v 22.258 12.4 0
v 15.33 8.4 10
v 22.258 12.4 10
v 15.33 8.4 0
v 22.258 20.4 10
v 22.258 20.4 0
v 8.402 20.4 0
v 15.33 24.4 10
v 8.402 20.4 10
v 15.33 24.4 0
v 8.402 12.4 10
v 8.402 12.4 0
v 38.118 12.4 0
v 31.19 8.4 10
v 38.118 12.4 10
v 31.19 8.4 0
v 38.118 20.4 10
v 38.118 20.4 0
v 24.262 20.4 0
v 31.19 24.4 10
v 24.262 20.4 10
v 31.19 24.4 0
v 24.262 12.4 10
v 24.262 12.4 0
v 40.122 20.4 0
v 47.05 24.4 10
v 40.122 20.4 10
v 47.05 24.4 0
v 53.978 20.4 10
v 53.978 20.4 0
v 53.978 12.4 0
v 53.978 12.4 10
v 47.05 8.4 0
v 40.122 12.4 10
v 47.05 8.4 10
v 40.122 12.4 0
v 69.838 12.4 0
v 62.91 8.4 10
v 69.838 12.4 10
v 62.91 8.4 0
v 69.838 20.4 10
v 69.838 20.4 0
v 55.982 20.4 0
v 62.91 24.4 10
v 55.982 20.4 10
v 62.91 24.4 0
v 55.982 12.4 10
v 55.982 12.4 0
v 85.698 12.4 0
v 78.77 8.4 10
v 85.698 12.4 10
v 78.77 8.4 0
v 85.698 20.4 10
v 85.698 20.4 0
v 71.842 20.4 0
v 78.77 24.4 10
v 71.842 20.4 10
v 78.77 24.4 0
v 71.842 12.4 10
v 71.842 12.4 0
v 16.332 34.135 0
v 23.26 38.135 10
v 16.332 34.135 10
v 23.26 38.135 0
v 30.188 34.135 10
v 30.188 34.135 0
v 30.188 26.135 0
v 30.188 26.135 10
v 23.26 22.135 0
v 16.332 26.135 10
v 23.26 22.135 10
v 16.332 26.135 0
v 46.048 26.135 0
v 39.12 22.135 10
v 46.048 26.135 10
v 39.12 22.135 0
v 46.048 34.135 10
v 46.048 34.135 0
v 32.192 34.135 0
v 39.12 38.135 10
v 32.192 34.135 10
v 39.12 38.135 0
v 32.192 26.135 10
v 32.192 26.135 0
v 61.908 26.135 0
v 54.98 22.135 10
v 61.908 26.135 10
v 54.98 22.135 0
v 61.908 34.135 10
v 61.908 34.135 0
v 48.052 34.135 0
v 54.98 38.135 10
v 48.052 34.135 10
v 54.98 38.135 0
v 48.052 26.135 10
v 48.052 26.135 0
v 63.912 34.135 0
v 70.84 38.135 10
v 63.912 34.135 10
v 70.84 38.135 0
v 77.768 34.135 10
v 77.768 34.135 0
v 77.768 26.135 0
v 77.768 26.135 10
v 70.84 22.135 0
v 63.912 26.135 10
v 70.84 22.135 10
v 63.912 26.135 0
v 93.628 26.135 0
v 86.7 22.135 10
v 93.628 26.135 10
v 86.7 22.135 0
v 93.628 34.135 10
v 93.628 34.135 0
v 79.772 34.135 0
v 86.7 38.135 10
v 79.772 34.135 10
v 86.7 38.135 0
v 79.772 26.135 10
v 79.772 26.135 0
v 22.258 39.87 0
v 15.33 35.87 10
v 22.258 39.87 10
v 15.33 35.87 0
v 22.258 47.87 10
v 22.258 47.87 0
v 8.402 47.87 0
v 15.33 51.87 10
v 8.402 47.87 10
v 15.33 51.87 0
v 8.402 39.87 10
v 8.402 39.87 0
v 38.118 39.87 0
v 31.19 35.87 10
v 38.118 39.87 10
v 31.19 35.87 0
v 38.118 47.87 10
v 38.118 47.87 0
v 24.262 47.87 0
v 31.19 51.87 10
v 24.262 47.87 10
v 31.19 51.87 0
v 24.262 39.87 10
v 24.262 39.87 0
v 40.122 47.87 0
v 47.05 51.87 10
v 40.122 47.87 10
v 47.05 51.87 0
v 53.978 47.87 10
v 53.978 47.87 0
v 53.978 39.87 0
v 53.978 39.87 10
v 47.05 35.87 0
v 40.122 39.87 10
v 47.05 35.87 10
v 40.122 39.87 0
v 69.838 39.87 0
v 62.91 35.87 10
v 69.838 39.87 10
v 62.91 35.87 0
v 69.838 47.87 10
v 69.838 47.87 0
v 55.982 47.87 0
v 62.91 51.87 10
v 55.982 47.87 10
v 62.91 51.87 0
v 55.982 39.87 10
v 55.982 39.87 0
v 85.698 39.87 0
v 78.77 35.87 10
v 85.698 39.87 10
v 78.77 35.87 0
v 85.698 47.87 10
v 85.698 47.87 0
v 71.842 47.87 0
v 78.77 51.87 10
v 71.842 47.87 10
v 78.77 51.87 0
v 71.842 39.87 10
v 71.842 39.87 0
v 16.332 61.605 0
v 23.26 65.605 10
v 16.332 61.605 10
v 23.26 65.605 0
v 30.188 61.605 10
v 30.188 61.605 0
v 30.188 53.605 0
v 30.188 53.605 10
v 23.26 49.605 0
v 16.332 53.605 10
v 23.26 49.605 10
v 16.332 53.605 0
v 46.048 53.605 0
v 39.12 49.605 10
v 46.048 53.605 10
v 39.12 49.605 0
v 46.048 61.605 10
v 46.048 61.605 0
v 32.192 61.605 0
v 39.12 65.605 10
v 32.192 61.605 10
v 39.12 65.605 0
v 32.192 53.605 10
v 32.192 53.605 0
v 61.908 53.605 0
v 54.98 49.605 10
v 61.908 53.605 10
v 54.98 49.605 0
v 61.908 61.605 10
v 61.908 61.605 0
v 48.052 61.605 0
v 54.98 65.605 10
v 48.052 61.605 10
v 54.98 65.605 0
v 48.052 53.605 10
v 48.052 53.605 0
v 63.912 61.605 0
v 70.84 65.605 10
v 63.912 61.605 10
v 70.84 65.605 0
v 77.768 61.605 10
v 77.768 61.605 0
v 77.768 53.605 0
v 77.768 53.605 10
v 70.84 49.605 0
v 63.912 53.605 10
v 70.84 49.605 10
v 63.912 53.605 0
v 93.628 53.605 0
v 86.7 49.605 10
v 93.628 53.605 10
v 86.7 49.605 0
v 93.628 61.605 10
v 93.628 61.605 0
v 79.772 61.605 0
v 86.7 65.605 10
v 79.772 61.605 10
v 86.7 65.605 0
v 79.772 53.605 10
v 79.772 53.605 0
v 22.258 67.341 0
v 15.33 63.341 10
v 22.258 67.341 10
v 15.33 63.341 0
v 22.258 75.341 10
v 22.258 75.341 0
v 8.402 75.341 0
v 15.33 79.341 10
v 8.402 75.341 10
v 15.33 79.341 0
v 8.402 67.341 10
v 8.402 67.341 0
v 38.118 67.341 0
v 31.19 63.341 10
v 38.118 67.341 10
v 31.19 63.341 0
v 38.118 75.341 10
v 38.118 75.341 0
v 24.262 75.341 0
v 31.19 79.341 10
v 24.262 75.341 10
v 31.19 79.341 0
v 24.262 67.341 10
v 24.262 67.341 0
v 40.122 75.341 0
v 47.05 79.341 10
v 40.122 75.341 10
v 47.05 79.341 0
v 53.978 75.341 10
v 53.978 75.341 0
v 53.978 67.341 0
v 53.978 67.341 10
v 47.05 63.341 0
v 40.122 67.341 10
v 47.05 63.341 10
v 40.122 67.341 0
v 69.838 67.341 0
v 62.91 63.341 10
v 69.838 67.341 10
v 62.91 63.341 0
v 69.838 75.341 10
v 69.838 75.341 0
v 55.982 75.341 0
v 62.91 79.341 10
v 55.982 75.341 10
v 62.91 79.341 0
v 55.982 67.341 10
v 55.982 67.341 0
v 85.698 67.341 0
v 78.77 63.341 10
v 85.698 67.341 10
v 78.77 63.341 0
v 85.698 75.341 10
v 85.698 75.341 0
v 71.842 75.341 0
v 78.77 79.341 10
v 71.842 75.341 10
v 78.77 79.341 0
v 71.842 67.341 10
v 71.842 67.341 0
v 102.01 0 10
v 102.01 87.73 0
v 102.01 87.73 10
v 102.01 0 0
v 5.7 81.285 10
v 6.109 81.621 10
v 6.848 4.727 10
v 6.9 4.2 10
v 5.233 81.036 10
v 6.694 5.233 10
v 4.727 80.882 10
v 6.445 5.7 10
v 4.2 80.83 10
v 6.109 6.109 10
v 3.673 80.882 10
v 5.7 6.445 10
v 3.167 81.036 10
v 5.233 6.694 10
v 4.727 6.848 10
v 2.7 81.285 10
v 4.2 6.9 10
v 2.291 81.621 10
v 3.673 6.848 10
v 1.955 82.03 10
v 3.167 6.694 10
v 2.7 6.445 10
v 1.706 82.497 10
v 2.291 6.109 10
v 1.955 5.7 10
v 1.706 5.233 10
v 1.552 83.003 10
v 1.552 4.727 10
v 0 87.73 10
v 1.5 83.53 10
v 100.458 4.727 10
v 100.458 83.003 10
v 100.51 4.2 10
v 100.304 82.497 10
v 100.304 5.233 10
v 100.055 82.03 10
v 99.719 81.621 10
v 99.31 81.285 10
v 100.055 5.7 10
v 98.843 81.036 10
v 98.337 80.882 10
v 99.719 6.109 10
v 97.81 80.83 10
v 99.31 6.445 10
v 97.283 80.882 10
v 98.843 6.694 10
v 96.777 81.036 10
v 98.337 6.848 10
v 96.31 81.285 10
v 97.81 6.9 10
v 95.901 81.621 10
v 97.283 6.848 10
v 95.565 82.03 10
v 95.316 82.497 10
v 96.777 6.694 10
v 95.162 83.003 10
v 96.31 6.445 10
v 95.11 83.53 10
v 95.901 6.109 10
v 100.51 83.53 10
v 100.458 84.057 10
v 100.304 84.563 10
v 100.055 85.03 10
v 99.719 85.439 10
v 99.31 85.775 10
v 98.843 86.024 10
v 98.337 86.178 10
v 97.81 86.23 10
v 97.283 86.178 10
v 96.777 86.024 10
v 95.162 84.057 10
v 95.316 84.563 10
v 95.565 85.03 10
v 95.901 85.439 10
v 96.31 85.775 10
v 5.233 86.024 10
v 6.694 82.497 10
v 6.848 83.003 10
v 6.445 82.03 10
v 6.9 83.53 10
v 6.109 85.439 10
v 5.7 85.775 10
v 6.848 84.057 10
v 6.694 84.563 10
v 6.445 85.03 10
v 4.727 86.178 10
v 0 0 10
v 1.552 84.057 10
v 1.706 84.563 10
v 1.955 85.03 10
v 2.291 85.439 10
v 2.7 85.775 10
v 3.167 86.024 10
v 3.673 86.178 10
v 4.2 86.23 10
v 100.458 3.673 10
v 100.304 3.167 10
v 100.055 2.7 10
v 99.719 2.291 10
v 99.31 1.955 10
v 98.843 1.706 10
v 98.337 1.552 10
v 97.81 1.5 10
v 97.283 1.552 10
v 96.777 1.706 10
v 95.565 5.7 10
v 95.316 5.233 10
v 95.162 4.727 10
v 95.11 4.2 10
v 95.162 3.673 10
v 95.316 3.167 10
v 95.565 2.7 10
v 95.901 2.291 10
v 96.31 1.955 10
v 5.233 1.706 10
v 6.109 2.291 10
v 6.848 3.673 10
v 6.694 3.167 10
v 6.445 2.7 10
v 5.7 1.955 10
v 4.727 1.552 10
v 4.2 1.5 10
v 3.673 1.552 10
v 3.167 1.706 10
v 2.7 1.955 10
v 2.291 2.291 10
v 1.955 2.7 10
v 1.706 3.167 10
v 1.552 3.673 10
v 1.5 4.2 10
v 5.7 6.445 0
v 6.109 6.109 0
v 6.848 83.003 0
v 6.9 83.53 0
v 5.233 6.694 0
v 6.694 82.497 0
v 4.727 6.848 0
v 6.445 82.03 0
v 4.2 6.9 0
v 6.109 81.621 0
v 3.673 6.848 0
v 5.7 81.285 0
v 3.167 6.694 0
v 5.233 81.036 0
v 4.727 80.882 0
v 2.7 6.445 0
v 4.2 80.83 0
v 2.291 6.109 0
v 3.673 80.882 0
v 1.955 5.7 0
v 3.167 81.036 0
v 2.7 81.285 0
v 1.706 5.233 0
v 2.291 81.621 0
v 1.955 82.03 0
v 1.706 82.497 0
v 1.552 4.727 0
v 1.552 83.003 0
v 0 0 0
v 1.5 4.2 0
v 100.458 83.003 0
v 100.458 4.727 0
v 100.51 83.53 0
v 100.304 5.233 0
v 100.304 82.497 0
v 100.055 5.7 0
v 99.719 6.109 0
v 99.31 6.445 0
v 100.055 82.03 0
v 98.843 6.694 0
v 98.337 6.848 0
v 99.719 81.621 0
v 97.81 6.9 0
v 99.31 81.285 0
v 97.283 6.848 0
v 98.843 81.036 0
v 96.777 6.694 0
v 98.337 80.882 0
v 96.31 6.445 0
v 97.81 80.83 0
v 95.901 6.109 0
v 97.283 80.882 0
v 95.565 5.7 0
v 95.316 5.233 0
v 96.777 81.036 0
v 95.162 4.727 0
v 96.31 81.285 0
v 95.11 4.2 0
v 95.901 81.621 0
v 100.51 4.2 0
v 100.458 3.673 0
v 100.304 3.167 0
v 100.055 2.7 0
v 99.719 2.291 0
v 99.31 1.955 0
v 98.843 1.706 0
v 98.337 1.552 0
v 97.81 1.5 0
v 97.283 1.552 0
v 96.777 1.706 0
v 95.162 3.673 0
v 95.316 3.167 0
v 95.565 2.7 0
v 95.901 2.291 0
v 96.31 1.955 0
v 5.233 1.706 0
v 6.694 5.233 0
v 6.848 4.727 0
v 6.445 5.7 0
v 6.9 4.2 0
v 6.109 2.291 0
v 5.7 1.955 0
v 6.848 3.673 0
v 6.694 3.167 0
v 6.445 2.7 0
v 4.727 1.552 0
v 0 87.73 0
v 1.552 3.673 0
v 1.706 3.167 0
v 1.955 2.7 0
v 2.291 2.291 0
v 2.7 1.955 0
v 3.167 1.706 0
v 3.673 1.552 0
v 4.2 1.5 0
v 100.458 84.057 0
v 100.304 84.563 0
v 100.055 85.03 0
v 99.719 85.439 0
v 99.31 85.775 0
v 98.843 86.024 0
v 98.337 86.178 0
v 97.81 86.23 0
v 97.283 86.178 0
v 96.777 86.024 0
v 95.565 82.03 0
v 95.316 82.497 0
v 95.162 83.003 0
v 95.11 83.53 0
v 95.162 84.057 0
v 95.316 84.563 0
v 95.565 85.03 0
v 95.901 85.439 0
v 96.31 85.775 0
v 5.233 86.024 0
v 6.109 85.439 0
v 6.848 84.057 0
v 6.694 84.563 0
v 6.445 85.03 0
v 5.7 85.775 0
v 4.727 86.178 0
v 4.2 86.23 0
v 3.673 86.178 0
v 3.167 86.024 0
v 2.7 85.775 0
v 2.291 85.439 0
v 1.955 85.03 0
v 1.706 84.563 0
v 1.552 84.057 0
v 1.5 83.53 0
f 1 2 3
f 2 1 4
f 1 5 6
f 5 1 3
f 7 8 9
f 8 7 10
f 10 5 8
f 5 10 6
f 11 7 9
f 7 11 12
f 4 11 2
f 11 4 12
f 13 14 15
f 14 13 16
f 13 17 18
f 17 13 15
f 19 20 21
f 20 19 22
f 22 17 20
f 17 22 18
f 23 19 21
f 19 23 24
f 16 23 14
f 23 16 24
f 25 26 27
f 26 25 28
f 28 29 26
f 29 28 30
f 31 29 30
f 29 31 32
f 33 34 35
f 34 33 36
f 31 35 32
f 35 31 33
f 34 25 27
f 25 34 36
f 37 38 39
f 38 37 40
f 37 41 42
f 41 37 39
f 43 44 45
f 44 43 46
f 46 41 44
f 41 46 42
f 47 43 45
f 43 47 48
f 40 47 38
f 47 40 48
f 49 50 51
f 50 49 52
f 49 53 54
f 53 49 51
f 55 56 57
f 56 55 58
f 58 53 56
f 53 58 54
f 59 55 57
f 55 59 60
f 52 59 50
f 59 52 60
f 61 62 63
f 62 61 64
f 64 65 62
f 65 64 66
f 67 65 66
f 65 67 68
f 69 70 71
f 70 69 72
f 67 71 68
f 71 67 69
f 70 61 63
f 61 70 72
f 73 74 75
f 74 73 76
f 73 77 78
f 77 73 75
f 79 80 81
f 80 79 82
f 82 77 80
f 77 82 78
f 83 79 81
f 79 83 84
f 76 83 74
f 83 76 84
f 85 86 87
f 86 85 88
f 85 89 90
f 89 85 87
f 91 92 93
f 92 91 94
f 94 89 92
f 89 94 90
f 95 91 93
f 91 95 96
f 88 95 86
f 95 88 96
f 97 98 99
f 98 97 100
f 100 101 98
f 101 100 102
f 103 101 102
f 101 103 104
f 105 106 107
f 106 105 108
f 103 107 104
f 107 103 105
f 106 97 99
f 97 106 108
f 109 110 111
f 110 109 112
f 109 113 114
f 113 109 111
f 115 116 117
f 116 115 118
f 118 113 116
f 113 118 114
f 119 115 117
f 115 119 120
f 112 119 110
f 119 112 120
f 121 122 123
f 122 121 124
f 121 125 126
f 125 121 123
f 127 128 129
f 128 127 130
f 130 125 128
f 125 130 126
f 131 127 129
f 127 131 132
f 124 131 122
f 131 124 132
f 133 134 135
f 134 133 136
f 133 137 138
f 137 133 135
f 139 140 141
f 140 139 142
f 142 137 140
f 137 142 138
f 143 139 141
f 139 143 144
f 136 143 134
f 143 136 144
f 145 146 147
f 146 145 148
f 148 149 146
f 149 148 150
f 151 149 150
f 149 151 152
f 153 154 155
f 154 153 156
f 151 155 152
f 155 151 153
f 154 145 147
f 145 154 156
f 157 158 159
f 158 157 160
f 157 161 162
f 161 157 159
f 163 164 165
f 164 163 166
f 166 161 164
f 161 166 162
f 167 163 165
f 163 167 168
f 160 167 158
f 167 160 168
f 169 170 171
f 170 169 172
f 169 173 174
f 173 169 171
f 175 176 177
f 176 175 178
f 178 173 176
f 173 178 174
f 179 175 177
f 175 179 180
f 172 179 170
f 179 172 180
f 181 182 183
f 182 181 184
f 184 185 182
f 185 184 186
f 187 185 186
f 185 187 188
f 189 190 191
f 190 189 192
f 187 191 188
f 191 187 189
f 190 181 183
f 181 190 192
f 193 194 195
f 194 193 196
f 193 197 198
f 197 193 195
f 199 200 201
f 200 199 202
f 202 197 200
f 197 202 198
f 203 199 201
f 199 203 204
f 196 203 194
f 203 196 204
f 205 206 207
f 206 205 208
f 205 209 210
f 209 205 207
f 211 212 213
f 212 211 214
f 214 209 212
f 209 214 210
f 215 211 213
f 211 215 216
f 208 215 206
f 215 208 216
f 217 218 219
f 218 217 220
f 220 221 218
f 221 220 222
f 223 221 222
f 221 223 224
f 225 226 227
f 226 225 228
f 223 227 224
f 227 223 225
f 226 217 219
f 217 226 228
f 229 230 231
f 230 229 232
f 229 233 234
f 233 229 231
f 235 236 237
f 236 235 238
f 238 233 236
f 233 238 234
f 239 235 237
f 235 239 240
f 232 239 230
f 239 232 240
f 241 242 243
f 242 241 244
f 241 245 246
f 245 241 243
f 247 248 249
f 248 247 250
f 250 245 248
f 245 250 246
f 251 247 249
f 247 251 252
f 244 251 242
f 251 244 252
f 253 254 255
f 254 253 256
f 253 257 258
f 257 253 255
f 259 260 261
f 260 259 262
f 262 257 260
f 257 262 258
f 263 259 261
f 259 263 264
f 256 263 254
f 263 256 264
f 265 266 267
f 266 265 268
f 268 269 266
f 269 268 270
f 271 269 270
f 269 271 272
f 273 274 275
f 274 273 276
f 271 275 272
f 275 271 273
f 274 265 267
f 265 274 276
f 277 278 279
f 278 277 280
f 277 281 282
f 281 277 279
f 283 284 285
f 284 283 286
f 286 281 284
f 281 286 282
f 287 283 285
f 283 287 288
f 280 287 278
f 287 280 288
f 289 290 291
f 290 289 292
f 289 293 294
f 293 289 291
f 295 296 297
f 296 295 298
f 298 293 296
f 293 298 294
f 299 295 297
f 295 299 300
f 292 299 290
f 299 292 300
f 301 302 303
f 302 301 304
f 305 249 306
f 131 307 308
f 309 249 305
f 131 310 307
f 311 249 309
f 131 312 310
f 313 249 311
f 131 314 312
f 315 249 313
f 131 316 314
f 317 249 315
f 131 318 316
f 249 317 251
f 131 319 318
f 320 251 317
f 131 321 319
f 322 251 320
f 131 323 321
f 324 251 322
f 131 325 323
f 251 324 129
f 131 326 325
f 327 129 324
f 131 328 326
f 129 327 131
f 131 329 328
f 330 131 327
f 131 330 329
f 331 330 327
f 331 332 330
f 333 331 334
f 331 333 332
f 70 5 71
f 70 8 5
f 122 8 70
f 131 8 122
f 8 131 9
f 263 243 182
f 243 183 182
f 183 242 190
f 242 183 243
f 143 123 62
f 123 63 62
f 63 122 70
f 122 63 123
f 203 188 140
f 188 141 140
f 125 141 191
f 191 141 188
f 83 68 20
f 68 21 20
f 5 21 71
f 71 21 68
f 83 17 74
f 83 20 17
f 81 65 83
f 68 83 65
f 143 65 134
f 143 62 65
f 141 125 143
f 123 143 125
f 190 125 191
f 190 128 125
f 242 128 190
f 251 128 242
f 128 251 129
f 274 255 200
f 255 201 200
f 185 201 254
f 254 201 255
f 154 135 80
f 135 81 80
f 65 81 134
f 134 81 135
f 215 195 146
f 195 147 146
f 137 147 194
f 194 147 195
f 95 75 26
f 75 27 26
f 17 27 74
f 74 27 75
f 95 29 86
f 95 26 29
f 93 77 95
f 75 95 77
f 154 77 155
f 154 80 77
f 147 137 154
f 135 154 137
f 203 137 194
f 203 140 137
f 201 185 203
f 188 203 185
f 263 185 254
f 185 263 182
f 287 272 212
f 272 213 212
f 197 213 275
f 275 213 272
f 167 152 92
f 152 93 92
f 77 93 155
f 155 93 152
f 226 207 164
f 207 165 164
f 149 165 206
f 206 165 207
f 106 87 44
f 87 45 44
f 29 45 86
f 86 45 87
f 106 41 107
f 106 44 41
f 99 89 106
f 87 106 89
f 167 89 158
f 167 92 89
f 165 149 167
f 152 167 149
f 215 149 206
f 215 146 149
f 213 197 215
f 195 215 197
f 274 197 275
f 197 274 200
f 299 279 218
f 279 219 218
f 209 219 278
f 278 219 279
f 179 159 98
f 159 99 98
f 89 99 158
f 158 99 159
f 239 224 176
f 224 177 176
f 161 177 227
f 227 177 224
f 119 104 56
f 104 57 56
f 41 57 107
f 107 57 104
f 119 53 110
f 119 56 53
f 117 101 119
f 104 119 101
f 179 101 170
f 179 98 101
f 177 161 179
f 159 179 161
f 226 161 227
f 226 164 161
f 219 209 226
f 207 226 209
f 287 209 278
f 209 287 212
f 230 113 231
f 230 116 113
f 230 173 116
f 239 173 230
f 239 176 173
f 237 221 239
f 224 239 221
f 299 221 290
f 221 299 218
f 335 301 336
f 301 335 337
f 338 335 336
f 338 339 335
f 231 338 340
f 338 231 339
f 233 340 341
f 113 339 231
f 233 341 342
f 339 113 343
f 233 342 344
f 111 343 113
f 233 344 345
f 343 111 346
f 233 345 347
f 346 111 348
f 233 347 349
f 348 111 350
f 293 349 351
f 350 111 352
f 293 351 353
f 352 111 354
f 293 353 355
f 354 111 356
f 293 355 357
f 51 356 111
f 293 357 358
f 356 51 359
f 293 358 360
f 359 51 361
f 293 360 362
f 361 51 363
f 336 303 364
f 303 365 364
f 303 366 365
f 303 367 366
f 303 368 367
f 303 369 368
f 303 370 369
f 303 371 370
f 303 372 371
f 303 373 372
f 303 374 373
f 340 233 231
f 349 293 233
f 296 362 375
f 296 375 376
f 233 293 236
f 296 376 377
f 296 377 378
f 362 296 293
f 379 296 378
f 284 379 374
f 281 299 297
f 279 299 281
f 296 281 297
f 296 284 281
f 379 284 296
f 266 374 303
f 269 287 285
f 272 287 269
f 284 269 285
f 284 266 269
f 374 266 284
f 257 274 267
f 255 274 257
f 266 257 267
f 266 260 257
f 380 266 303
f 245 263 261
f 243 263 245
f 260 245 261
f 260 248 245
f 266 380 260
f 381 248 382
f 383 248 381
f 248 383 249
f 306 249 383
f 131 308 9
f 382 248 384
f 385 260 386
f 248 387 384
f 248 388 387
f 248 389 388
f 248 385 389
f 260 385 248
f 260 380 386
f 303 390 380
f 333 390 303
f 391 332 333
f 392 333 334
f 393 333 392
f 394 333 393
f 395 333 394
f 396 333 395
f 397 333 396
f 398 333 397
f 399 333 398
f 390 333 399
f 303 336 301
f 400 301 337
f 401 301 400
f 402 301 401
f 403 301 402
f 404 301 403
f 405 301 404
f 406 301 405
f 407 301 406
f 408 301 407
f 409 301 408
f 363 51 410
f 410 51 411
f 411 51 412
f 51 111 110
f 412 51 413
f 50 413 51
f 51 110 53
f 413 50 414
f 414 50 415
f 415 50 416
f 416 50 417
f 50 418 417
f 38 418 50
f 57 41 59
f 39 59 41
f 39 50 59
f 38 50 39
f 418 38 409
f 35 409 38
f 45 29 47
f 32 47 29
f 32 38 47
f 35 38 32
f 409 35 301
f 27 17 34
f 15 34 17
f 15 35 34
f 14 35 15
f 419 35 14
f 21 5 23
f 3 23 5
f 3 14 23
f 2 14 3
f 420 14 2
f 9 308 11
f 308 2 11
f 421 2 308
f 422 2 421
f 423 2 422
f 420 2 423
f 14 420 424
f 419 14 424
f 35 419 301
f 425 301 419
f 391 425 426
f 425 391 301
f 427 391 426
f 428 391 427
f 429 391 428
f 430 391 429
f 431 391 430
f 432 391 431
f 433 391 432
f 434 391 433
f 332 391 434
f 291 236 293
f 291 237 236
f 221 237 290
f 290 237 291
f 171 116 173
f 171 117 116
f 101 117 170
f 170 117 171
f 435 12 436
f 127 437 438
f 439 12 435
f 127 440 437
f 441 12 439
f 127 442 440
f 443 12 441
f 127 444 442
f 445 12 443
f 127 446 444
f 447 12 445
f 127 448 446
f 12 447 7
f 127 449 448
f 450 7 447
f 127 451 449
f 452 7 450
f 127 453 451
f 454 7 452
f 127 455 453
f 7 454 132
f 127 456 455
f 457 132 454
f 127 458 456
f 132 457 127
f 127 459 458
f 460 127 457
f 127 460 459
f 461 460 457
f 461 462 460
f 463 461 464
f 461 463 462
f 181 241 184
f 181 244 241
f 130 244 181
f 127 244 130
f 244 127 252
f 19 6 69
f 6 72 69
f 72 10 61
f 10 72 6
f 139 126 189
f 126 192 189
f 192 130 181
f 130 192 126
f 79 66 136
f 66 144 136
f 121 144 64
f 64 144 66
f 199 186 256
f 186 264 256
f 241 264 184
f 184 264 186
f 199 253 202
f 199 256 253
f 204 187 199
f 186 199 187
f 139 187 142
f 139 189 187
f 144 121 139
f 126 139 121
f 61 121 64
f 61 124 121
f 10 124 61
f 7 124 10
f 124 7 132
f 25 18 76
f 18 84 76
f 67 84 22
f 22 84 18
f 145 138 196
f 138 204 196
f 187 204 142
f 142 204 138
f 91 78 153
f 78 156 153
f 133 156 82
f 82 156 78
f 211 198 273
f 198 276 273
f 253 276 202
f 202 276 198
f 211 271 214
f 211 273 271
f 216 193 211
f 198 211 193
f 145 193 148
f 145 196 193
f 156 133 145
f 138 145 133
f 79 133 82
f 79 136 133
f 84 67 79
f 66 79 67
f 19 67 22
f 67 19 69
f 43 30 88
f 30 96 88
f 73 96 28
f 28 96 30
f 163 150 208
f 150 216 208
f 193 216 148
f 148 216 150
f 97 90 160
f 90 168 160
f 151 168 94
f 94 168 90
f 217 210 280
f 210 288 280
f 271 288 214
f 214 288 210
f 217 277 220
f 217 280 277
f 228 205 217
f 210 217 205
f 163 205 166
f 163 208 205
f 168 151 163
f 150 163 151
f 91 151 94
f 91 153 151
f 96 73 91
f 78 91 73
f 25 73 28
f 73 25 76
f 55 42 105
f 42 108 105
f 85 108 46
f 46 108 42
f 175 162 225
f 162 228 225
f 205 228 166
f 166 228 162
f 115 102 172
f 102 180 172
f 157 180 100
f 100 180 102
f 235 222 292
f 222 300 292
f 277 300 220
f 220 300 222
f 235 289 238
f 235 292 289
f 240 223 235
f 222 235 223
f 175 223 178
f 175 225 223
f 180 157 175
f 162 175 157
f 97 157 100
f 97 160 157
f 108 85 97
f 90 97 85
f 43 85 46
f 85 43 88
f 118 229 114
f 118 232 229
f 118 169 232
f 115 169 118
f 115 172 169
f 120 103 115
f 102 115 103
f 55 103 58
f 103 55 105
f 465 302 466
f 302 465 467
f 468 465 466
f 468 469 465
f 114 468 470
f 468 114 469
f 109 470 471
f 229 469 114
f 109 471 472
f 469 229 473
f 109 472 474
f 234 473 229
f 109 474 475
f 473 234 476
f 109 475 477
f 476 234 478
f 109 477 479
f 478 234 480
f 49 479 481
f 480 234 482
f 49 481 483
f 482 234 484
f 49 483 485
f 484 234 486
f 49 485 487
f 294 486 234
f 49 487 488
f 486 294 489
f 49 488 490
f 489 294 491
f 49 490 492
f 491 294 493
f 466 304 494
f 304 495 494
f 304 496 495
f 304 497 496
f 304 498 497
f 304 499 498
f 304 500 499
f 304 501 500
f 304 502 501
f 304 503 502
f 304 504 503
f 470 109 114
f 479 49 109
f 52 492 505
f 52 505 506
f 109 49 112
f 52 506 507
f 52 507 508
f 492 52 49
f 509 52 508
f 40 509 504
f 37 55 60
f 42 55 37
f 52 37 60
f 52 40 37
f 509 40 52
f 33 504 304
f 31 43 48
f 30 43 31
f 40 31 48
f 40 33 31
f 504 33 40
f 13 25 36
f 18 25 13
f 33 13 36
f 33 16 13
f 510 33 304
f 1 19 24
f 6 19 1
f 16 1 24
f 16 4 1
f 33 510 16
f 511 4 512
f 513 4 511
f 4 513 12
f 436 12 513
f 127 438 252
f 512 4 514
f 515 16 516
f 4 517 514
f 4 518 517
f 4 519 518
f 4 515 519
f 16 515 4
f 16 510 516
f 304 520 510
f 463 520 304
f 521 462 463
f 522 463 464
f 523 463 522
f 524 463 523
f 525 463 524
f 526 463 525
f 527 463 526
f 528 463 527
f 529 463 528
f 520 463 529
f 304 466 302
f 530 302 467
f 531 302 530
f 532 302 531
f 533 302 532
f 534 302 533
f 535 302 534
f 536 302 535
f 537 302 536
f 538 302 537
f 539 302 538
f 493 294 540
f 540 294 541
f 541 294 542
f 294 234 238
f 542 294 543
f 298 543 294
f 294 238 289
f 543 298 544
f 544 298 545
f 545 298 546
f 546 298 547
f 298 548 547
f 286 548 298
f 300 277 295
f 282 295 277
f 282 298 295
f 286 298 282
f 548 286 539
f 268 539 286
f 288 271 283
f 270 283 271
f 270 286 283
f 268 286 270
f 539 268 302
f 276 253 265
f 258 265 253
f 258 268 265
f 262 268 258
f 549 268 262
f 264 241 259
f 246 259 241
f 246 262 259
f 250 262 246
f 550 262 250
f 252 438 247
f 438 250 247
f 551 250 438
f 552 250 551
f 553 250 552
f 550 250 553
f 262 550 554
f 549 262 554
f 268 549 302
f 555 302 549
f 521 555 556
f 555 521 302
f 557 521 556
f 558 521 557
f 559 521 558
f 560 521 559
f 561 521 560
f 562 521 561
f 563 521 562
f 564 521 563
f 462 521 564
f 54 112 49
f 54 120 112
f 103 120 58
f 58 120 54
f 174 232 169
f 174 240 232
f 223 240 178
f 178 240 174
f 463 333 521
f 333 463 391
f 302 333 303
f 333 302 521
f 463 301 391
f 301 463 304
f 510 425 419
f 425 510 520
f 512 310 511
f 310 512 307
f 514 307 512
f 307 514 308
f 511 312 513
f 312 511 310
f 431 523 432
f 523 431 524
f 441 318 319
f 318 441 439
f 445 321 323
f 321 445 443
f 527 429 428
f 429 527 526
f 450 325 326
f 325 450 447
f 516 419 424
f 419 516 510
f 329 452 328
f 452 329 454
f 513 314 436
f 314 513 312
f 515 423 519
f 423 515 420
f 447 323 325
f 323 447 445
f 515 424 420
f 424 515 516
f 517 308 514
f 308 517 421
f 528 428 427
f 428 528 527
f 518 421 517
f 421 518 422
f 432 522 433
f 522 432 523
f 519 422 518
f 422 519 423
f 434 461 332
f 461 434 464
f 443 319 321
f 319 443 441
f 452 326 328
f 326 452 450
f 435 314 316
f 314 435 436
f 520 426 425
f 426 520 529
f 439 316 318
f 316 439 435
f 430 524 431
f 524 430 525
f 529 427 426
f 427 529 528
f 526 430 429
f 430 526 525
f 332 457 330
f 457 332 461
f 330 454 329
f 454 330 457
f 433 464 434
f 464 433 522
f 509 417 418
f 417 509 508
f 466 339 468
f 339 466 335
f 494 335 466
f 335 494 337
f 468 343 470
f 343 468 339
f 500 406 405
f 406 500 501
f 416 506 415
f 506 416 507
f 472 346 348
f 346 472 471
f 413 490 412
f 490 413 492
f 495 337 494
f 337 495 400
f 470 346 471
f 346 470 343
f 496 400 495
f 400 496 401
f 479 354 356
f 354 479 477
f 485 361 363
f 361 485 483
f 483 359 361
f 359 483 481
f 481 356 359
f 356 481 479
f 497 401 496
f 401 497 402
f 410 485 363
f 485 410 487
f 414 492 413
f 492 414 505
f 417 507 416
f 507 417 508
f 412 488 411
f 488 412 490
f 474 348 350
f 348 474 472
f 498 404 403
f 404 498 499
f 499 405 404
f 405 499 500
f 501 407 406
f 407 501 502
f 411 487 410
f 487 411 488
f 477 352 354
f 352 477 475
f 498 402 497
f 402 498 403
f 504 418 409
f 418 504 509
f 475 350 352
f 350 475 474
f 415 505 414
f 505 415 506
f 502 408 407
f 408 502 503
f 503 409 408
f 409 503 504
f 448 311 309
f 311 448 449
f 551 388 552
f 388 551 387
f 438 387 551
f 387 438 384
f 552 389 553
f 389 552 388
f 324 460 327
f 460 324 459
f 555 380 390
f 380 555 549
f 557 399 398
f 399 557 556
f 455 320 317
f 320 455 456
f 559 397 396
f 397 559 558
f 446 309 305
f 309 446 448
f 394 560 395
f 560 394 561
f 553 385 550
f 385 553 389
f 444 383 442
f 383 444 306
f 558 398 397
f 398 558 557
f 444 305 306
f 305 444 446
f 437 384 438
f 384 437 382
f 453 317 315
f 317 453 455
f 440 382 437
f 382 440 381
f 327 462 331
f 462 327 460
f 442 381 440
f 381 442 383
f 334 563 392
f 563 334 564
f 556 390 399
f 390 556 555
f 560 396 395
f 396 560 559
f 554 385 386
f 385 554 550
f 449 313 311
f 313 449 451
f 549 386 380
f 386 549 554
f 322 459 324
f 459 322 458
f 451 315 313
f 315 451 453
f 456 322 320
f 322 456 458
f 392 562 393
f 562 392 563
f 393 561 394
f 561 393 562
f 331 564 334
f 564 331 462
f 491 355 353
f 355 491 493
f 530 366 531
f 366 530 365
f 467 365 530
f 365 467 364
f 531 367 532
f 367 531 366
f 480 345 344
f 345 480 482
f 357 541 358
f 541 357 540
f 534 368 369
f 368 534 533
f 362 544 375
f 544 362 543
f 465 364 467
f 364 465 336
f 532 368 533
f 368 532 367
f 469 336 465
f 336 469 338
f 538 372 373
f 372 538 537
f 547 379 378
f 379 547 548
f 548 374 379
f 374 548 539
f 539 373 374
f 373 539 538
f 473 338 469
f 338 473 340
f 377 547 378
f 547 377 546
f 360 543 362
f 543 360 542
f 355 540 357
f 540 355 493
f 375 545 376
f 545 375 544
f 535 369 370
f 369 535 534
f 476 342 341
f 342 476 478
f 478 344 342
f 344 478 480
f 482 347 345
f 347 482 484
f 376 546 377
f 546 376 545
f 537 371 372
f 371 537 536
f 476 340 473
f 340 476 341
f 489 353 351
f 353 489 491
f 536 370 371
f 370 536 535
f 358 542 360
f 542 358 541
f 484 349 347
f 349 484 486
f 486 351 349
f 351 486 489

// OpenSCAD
$fn = 32;

// ----------------------------------------------------------------------
// Honeycomb panel: 102.01 x 87.73 mm, 25 cells of 16 mm
// ----------------------------------------------------------------------

// --- parameters (mm) ---
panel_w = 102.01;         // panel width
panel_d = 87.73;          // panel depth
thick = 10;               // panel thickness
cell_r = 8;               // hex cell circumradius
pitch = 15.86;            // hex cell pitch (centre to centre)
web = 2;                  // web between the cells
columns = 5;              // columns of cells
rows = 5;                 // rows of cells
cell_count = 25;          // total cells
shift_x = 15.33;          // first cell offset in x
shift_y = 16.4;           // first cell offset in y
mount_d = 5.4;            // corner mounting holes
hole_off = 4.2;           // mounting hole offset from the corners

difference() {
  union() {
    cube([panel_w, panel_d, thick]);
  }
  /* hexagonal cells, point-up, cut right through the plate */
  for (row = [0 : rows - 1]) {
    for (col = [0 : columns - 1]) {
      translate([shift_x + col * pitch + (row % 2) * pitch / 2, shift_y + row * pitch * 0.866025, -2.5]) rotate([0, 0, 30]) cylinder(h = thick + 5, d = 2 * cell_r, $fn = 6);
    }
  }
  /* corner mounting holes, clear of the outer cell web */
  translate([4.2, 4.2, -2.5]) cylinder(h = thick + 5, d = mount_d);
  translate([97.81, 4.2, -2.5]) cylinder(h = thick + 5, d = mount_d);
  translate([4.2, 83.53, -2.5]) cylinder(h = thick + 5, d = mount_d);
  translate([97.81, 83.53, -2.5]) cylinder(h = thick + 5, d = mount_d);
}
